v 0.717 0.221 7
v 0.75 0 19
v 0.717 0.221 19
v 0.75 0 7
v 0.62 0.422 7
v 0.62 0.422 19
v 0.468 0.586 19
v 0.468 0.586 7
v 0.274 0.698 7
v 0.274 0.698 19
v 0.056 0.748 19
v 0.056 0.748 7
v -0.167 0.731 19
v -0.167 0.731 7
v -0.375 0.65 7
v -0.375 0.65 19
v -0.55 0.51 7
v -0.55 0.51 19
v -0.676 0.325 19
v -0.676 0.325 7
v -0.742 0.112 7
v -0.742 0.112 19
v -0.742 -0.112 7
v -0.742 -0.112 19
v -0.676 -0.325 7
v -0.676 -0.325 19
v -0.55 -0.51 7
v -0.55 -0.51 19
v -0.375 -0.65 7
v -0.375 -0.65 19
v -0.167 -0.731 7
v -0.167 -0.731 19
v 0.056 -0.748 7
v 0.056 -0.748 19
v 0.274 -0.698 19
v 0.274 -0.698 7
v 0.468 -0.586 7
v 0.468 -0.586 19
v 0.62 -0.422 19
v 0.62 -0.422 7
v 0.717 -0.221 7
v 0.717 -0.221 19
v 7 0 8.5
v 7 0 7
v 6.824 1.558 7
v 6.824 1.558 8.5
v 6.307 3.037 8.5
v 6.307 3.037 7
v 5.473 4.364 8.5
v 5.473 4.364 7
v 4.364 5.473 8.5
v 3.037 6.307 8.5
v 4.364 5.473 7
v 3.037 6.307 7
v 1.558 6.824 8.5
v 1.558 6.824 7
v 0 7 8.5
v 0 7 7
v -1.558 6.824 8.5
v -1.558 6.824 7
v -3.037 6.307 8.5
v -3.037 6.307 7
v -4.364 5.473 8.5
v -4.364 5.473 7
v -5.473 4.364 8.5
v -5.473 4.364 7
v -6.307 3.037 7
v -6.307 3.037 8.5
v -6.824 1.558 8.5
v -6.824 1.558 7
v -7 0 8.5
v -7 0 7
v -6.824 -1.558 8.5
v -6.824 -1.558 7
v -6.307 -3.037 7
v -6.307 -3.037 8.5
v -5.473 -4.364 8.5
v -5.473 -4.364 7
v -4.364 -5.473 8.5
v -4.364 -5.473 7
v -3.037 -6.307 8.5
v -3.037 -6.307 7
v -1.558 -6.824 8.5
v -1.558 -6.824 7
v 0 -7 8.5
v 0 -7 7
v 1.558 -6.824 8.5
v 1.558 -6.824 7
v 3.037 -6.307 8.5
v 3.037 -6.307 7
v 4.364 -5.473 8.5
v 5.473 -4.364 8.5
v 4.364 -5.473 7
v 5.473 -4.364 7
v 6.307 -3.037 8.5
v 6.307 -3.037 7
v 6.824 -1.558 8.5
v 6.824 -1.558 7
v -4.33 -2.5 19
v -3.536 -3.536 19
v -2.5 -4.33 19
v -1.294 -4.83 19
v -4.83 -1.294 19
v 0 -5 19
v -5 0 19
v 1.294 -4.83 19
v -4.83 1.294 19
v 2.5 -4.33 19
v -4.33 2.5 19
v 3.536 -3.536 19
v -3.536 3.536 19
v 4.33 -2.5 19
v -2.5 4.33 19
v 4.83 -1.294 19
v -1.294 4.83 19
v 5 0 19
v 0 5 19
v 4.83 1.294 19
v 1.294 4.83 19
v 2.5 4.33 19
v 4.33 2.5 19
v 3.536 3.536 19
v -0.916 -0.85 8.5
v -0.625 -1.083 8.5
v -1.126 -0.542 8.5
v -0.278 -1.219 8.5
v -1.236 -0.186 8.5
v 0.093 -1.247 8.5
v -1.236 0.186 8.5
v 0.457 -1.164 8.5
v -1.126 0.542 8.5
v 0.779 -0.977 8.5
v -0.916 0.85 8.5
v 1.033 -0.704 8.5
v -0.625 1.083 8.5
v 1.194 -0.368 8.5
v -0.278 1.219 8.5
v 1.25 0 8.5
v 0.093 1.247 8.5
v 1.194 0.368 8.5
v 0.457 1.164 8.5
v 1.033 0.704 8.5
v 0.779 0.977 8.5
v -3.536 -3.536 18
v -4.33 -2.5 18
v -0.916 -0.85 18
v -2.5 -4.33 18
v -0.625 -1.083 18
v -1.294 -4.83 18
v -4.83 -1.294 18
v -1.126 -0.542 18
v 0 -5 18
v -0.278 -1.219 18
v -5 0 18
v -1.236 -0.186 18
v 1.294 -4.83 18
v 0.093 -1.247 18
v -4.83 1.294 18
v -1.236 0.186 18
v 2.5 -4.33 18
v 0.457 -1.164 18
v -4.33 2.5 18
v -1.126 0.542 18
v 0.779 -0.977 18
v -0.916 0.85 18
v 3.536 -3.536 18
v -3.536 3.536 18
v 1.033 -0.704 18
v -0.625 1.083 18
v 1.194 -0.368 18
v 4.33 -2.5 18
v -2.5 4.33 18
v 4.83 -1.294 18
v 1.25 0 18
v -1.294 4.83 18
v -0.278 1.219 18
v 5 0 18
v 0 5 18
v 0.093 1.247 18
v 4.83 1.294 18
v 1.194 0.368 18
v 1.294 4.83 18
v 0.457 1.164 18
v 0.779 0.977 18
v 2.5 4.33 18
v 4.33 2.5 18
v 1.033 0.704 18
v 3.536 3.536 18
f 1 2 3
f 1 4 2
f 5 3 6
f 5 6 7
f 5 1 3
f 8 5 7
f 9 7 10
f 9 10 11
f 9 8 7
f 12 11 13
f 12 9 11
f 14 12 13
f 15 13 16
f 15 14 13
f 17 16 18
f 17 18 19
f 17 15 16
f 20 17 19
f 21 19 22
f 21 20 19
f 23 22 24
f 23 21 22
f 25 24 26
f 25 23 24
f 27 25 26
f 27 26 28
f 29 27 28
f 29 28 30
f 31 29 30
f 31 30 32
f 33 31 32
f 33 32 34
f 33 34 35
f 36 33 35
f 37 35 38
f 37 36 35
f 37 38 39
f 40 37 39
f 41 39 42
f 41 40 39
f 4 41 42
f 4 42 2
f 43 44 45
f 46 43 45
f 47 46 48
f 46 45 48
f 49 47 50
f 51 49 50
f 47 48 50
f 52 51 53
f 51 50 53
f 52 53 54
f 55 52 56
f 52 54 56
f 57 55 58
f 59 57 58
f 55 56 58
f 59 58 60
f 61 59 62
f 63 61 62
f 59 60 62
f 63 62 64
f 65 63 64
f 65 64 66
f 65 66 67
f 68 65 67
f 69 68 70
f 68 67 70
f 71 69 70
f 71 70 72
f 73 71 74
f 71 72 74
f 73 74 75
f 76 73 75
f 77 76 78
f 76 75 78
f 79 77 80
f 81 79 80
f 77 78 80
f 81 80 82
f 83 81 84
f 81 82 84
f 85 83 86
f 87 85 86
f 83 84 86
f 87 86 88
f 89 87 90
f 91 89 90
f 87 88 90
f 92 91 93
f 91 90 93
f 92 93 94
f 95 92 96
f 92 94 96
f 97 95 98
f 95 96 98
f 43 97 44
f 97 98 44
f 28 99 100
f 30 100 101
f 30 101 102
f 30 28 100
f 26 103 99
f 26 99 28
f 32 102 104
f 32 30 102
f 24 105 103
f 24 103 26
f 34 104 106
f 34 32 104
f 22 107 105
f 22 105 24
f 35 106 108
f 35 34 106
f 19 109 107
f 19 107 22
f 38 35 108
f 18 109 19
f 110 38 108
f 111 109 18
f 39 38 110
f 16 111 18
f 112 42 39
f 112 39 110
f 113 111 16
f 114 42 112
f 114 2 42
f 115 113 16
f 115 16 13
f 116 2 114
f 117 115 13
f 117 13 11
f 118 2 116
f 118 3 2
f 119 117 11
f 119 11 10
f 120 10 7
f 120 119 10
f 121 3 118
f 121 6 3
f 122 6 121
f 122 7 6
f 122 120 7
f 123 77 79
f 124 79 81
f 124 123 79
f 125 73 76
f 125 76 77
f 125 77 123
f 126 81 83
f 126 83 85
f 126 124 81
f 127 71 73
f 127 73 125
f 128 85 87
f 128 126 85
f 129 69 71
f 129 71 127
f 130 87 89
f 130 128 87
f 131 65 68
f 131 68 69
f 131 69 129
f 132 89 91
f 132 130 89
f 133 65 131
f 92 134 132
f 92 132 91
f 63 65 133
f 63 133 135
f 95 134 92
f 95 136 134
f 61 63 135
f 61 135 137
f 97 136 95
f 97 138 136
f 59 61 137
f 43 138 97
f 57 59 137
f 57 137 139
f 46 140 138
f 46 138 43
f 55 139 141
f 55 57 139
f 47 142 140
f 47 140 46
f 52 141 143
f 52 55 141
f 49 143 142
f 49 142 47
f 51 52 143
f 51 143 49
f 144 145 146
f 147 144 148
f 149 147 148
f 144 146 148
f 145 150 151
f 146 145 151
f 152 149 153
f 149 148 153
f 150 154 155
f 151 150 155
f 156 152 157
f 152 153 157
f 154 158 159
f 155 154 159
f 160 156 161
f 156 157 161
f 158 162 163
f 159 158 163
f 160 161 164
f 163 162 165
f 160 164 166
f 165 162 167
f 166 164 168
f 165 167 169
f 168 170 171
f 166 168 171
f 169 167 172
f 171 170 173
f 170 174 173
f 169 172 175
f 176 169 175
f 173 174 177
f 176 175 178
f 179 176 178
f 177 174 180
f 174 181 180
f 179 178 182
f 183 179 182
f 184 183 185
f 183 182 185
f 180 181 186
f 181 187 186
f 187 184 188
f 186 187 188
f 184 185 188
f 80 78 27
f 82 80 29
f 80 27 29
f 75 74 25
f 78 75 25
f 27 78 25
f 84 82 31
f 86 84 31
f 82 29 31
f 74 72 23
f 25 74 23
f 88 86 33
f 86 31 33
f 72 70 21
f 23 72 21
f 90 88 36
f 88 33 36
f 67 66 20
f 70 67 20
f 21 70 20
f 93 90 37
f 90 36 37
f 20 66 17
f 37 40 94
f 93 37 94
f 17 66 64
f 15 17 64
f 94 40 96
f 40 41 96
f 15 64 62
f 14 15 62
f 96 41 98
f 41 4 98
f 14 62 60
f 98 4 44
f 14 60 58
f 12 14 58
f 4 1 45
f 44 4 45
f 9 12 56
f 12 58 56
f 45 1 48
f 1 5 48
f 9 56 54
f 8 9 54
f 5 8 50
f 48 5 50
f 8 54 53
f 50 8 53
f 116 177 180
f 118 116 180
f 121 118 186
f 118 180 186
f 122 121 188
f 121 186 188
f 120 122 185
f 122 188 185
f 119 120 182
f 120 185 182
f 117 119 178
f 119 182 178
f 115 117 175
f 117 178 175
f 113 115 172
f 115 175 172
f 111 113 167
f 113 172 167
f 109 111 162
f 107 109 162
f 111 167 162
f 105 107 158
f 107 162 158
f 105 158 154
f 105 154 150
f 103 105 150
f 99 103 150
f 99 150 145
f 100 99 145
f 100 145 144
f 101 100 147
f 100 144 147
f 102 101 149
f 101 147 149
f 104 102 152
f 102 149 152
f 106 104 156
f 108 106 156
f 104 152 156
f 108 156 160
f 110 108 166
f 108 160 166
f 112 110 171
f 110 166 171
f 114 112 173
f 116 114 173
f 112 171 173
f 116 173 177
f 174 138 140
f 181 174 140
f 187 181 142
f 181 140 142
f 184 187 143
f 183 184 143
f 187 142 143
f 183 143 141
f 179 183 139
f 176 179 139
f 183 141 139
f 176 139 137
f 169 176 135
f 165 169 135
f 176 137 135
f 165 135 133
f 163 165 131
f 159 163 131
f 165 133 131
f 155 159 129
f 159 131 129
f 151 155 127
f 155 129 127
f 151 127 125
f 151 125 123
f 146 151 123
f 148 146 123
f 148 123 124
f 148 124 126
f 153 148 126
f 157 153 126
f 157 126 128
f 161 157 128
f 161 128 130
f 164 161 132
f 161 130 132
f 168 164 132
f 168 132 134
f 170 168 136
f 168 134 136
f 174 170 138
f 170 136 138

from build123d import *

# Parameters (mm, degrees)
F1_R     = 7
F1_R_2   = 0.75
F2_DEPTH = 1.5
F3_R     = 1.25
F3_R_2   = 0.75
F4_DEPTH = 9.5
F5_R     = 5
F5_R_2   = 1.25
F5_R_3   = 0.75
F6_DEPTH = 1


with BuildPart() as f2:
    # F1 (on offset) → F2 (new body)
    with BuildSketch(Plane.XY.offset(7)):
        Circle(F1_R)
        Circle(F1_R_2, mode=Mode.SUBTRACT)
    extrude(amount=F2_DEPTH)

    # F3 (on face) → F4 (join)
    with BuildSketch(Plane.XY.offset(8.5)):
        Circle(F3_R)
        Circle(F3_R_2, mode=Mode.SUBTRACT)
    extrude(amount=F4_DEPTH)

    # F5 (on face) → F6 (join)
    with BuildSketch(Plane.XY.offset(18)):
        Circle(F5_R)
        Circle(F5_R_2, mode=Mode.SUBTRACT)
        Circle(F5_R_2)
        Circle(F5_R_3, mode=Mode.SUBTRACT)
    extrude(amount=F6_DEPTH)


solid = f2.part
